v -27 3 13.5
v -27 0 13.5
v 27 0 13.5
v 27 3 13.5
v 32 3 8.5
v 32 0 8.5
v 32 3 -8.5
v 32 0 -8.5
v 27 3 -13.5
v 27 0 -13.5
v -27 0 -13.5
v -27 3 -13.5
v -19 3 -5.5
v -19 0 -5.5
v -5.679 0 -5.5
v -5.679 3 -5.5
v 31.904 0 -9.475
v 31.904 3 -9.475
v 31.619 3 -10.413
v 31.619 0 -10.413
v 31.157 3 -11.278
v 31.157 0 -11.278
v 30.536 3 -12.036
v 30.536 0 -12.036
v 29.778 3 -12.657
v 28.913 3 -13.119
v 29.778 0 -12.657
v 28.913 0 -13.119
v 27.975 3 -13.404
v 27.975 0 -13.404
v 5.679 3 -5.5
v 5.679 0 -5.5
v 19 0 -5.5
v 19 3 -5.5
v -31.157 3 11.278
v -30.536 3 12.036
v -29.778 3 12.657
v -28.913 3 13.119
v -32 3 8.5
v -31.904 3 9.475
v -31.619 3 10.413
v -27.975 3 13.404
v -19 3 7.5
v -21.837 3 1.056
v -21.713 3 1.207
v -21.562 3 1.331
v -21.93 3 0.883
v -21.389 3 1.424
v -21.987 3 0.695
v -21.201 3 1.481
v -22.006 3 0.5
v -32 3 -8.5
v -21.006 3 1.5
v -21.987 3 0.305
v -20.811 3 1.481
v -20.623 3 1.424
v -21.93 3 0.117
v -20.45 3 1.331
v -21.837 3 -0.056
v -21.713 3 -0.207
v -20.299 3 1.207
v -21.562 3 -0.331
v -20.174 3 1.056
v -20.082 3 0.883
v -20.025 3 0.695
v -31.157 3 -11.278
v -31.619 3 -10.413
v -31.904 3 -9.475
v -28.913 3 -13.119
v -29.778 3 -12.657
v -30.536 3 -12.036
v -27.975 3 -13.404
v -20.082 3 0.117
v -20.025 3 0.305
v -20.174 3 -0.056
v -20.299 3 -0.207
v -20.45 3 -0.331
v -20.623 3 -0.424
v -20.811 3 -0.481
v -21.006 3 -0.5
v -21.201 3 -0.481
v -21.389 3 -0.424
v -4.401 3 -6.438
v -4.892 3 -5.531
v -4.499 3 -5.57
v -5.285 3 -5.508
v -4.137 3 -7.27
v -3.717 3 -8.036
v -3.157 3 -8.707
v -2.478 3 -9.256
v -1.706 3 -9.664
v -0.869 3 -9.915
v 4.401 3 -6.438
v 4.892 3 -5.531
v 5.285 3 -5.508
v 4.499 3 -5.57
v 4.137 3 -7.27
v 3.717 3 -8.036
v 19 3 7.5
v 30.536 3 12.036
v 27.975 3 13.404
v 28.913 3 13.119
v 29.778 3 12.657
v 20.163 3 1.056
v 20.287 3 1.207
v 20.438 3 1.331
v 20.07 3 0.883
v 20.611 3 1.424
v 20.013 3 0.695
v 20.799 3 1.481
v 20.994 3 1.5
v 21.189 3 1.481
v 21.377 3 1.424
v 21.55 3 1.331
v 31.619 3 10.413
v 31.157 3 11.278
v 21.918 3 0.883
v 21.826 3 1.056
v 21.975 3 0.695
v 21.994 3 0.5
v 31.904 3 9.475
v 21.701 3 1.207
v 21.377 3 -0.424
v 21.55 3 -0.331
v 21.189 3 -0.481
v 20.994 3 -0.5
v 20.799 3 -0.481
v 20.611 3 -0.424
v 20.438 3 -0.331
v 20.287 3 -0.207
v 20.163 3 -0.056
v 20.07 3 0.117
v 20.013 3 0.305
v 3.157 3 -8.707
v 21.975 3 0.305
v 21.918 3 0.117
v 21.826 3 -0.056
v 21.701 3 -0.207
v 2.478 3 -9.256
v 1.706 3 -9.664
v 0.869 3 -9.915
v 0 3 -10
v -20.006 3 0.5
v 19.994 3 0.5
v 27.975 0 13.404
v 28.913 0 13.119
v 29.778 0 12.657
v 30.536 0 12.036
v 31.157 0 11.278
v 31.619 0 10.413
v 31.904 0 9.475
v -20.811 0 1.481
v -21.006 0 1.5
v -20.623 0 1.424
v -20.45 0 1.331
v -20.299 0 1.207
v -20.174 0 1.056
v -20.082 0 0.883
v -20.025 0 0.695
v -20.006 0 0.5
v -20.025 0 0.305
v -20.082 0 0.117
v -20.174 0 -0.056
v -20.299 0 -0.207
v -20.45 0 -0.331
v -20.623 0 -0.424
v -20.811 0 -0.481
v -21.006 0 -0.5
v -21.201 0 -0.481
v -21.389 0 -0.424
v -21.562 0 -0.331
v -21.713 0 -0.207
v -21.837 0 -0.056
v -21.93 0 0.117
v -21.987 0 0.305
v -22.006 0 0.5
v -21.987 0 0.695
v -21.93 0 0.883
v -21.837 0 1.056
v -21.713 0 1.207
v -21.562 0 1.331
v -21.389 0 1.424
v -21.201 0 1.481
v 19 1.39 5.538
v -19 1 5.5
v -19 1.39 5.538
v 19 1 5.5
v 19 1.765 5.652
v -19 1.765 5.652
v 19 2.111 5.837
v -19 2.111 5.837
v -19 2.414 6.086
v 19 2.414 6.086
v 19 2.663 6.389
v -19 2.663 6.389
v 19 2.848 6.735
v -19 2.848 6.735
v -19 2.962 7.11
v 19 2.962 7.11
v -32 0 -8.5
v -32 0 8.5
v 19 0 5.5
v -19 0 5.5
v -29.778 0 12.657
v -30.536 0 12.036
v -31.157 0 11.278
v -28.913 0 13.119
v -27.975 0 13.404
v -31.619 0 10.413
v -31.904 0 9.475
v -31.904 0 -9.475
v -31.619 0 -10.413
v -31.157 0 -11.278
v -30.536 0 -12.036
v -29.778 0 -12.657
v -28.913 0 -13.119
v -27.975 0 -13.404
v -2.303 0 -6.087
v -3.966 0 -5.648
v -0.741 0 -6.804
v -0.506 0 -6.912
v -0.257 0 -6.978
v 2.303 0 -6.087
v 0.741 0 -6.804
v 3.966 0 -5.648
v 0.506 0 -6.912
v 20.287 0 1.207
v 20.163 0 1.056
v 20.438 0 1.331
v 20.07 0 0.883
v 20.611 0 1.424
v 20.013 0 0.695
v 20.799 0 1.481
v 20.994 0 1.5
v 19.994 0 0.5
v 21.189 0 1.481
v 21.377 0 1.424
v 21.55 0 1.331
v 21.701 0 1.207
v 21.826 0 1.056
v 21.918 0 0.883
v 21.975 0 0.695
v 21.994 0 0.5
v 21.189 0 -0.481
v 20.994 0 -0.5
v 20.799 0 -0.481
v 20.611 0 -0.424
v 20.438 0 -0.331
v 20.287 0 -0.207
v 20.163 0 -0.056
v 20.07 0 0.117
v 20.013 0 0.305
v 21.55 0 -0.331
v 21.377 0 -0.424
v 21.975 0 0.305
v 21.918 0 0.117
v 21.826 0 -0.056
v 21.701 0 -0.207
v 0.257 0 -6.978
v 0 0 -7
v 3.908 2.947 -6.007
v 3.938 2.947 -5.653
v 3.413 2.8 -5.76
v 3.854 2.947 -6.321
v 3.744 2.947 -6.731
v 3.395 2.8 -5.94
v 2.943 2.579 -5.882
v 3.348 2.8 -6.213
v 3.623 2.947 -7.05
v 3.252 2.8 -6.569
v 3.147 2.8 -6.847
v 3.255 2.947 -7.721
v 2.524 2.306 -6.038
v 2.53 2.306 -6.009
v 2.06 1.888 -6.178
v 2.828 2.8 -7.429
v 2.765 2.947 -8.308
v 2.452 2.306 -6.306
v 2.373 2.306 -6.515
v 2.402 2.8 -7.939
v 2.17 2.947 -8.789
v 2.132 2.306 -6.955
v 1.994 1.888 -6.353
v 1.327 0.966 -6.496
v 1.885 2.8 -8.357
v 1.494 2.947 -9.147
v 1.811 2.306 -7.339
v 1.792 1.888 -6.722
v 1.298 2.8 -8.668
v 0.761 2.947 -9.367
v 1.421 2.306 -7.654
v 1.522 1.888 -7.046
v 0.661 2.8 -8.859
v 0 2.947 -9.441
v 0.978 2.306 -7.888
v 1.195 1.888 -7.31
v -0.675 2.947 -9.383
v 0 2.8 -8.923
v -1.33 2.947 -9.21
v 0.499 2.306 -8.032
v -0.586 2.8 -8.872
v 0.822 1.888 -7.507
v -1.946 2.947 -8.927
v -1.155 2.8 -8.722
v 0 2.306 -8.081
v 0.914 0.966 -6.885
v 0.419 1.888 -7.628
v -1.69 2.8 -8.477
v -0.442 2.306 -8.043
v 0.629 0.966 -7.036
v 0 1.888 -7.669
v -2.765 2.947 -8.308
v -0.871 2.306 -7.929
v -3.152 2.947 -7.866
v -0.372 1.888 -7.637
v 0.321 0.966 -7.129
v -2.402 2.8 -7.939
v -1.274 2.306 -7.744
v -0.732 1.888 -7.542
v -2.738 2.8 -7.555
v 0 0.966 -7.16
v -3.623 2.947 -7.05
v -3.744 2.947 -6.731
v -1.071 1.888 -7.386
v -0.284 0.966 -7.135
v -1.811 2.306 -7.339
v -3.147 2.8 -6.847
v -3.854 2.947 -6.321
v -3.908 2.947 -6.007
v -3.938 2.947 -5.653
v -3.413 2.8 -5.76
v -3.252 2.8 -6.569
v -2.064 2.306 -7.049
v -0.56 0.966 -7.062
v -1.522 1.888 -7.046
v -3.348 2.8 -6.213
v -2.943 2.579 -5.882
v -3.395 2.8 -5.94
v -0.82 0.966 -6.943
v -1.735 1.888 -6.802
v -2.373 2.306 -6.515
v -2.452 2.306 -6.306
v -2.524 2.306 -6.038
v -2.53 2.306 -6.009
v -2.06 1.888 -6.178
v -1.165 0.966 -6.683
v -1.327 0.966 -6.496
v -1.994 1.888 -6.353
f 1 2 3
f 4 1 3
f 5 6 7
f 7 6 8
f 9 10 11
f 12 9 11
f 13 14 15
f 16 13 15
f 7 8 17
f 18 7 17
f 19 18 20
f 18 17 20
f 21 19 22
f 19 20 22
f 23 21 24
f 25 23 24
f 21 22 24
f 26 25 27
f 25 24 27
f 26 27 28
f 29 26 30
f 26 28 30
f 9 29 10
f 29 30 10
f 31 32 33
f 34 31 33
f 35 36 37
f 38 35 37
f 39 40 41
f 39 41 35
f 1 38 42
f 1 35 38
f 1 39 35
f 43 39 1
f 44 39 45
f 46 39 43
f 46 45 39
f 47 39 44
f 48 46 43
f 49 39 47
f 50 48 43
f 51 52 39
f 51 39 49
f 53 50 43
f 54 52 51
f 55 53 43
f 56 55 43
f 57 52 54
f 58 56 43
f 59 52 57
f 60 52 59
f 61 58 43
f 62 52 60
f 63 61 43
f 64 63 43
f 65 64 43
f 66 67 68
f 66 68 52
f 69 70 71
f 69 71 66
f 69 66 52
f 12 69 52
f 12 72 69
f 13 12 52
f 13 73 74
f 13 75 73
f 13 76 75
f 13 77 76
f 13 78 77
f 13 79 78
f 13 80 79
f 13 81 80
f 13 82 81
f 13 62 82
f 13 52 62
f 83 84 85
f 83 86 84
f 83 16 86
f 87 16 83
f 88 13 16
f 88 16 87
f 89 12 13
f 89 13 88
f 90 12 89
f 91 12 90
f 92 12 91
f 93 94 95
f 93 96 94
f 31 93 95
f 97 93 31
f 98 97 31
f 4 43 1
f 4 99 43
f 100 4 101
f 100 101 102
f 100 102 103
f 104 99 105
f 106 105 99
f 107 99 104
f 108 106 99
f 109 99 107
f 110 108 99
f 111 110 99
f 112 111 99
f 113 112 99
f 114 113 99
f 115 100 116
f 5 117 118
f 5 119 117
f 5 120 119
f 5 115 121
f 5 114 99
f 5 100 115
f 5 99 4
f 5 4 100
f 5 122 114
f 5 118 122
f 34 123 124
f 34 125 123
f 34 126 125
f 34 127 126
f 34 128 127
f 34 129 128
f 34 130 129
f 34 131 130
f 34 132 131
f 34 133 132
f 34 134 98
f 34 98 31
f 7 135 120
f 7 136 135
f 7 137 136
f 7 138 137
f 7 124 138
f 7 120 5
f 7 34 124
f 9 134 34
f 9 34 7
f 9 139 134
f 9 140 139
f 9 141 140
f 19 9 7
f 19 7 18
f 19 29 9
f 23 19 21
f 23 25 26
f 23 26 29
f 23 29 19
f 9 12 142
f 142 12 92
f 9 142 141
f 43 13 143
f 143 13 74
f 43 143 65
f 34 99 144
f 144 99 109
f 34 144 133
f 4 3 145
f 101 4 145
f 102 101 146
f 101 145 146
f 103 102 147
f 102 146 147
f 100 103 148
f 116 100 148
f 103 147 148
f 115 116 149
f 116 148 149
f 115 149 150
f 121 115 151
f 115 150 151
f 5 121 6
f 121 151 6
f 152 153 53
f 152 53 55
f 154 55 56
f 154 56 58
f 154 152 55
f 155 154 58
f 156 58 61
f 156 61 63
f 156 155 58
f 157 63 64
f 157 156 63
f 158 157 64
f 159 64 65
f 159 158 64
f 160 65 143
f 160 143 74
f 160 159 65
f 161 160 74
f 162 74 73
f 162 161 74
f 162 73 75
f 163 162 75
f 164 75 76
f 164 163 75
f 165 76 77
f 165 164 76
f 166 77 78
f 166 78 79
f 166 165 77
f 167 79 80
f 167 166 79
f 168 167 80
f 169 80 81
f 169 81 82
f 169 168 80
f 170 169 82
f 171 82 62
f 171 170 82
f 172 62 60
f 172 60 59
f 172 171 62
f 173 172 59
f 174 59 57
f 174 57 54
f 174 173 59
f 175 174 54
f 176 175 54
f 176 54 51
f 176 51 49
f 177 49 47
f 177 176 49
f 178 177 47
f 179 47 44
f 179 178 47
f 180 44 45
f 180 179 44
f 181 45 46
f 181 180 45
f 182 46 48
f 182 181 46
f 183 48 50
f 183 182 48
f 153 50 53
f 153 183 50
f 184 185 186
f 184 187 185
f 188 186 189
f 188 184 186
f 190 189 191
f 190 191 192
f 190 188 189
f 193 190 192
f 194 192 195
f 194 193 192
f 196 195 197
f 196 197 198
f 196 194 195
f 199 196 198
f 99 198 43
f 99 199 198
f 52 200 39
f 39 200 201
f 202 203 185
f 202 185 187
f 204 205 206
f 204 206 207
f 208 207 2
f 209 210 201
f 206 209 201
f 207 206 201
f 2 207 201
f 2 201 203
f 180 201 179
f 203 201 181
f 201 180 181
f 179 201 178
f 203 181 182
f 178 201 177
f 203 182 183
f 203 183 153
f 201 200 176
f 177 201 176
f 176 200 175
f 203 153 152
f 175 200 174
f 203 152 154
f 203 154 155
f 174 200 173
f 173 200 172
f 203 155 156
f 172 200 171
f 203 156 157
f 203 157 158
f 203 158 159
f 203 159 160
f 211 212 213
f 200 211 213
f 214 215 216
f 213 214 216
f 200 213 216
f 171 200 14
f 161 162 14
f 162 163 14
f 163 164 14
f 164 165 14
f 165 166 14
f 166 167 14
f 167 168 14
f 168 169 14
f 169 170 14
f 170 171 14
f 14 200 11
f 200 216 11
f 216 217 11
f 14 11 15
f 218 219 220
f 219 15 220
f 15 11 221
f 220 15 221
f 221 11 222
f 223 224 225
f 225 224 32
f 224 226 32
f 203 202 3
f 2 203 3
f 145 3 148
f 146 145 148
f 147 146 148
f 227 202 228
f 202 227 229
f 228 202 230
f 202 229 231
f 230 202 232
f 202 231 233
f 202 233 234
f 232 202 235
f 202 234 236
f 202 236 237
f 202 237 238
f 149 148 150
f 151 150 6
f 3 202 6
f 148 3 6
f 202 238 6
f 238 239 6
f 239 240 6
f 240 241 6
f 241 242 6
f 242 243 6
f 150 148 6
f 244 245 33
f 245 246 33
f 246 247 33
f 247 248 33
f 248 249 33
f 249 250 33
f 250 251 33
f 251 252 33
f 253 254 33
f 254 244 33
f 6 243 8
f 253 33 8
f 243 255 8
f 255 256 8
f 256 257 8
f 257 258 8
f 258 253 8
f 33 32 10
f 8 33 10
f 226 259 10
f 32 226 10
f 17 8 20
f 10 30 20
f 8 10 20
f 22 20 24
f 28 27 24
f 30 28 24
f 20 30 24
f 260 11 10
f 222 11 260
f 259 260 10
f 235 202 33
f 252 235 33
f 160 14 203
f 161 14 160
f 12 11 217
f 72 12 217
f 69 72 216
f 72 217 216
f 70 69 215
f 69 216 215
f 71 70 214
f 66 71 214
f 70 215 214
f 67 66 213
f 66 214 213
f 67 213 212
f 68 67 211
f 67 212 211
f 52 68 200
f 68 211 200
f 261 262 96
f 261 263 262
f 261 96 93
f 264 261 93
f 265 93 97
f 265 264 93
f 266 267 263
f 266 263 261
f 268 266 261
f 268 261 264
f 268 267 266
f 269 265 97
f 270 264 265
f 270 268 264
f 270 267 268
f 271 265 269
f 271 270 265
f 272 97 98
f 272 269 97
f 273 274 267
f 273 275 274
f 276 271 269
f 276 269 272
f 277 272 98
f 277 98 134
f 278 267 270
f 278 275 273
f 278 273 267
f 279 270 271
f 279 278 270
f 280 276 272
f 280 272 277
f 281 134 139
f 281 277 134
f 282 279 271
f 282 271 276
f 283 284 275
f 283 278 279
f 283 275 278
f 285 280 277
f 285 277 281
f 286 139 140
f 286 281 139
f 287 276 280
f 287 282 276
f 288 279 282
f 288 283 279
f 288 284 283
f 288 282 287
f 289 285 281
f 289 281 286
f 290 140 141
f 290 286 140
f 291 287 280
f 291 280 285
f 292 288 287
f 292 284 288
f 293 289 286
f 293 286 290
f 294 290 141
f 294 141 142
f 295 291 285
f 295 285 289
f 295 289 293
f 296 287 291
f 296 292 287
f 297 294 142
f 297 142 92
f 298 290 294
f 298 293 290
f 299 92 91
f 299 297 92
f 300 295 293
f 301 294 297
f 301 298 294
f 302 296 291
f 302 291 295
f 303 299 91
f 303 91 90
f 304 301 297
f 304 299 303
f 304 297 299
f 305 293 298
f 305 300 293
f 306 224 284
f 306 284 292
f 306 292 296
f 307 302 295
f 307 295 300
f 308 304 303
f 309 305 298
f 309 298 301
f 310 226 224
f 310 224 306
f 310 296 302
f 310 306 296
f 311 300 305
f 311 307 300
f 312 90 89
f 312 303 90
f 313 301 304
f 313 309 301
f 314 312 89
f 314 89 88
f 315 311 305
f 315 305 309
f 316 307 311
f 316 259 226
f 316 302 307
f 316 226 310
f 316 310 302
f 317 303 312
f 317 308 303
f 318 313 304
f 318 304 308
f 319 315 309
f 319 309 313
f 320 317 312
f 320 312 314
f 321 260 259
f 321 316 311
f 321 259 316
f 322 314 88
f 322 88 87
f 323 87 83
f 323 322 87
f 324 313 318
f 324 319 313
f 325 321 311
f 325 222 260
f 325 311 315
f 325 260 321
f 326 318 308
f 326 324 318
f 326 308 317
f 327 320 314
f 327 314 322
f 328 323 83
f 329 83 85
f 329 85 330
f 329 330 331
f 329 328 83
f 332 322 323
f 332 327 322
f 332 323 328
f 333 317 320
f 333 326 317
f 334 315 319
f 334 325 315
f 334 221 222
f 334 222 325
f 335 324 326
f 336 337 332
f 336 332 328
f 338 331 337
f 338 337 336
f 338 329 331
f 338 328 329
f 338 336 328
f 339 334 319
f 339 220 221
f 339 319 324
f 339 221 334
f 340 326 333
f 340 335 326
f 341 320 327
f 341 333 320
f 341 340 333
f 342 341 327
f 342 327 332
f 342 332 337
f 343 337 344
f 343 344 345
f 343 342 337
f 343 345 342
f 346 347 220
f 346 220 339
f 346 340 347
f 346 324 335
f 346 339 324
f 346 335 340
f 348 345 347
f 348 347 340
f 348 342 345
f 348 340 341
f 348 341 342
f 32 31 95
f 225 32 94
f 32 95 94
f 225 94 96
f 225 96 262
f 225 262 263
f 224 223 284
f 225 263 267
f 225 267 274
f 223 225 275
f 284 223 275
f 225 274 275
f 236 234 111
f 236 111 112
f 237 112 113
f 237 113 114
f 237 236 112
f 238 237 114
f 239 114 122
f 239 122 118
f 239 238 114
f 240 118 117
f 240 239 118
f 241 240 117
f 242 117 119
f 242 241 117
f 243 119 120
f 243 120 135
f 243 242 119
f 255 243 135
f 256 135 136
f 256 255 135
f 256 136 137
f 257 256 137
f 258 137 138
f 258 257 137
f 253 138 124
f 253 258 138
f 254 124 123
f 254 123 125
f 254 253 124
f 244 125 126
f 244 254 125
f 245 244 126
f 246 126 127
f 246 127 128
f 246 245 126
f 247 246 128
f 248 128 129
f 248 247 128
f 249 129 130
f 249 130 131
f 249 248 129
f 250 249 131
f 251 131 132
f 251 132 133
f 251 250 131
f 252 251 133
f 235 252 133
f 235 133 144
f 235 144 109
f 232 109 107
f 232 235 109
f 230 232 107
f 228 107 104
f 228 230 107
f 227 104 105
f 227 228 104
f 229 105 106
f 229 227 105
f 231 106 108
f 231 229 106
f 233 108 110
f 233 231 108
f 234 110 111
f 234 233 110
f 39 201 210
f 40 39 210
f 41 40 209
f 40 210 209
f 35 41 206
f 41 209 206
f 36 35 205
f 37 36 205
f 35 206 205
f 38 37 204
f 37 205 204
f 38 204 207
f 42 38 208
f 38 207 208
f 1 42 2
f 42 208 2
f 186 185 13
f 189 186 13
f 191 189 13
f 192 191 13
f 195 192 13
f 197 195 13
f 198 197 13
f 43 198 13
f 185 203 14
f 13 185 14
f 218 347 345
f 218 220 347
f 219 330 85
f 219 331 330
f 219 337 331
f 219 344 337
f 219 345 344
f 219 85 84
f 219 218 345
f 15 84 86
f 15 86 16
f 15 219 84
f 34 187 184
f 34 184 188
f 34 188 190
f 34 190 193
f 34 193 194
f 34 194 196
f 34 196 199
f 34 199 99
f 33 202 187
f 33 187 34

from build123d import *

# Parameters (mm, degrees)
SKETCH1_R           = 1
SKETCH1_W           = 38
SKETCH1_H           = 11
MAIN_EXTRUDE_DEPTH  = 3
WIRE_CUT_DEPTH      = 35.860436027
WIRE_CUT_DEPTH_BACK = 35.860436027
SKETCH2_R           = 1.5
FILLET1_R           = 10
FILLET2_R           = 3
FILLET3_R           = 2


with BuildPart() as part:
    # Sketch1 → Main extrude (new body)
    with BuildSketch(Plane(origin=(0, 0, 0), x_dir=(1, 0, 0), z_dir=(0, 1, 0))):
        with BuildLine():
            Line((-32, 8.5), (-32, -8.5))
            ThreePointArc((-32, -8.5), (-30.535533906, -12.035533906), (-27, -13.5))
            Line((-27, -13.5), (27, -13.5))
            ThreePointArc((27, -13.5), (30.535533906, -12.035533906), (32, -8.5))
            Line((32, -8.5), (32, 8.5))
            ThreePointArc((32, 8.5), (30.535533906, 12.035533906), (27, 13.5))
            Line((27, 13.5), (-27, 13.5))
            ThreePointArc((-27, 13.5), (-30.535533906, 12.035533906), (-32, 8.5))
        make_face()
        with Locations(Location((-21.005953225, -0.5, 0), (0, 0, 270))):
            Circle(SKETCH1_R, mode=Mode.SUBTRACT)
        with Locations(Location((20.994046775, -0.5, 0), (0, 0, 270))):
            Circle(SKETCH1_R, mode=Mode.SUBTRACT)
        Rectangle(SKETCH1_W, SKETCH1_H, mode=Mode.SUBTRACT)
    extrude(amount=MAIN_EXTRUDE_DEPTH)

    # Sketch2 → Wire cut (cut, two sides: drawn at the far end of the back side and taken through both)
    with BuildSketch(Plane(origin=(0, 3, 0), x_dir=(1, 0, 0), z_dir=(0, 1, 0)).offset(-WIRE_CUT_DEPTH_BACK)):
        with Locations((0, 5.5)):
            Circle(SKETCH2_R)
    extrude(amount=WIRE_CUT_DEPTH + WIRE_CUT_DEPTH_BACK, mode=Mode.SUBTRACT)

    # Fillet1
    fillet1_edges = [part.edges().sort_by_distance(p)[0] for p in [
        (-1.5, 1.5, -5.5),
        (1.5, 1.5, -5.5),
    ]]
    fillet(fillet1_edges, radius=FILLET1_R)

    # Fillet2
    # the kernel refuses this fillet: 3 mm, written as the material it takes off along each edge
    with BuildSketch(Plane(origin=(0, 3, -5.5), x_dir=(0.003141587485879651, 0, 0.9999950652018582), z_dir=(-0.9999950652018582, 0, 0.003141587485879651))) as fillet2_piece_1:
        with BuildLine():
            CenterArc((1.5 + FILLET2_R, -FILLET2_R), FILLET2_R, 90, 90)
            Line((1.5 + FILLET2_R, 0), (1.5, 0))
            Line((1.5, 0), (1.5, -FILLET2_R))
        make_face()
    revolve(axis=Axis((0, 3, -5.5), (0, 1, 0)), revolution_arc=359.64, mode=Mode.SUBTRACT)

    # Fillet3
    fillet3_edges = [part.edges().sort_by_distance(p)[0] for p in [
        (0, 3, 5.5),
    ]]
    fillet(fillet3_edges, radius=FILLET3_R)


solid = part.part
